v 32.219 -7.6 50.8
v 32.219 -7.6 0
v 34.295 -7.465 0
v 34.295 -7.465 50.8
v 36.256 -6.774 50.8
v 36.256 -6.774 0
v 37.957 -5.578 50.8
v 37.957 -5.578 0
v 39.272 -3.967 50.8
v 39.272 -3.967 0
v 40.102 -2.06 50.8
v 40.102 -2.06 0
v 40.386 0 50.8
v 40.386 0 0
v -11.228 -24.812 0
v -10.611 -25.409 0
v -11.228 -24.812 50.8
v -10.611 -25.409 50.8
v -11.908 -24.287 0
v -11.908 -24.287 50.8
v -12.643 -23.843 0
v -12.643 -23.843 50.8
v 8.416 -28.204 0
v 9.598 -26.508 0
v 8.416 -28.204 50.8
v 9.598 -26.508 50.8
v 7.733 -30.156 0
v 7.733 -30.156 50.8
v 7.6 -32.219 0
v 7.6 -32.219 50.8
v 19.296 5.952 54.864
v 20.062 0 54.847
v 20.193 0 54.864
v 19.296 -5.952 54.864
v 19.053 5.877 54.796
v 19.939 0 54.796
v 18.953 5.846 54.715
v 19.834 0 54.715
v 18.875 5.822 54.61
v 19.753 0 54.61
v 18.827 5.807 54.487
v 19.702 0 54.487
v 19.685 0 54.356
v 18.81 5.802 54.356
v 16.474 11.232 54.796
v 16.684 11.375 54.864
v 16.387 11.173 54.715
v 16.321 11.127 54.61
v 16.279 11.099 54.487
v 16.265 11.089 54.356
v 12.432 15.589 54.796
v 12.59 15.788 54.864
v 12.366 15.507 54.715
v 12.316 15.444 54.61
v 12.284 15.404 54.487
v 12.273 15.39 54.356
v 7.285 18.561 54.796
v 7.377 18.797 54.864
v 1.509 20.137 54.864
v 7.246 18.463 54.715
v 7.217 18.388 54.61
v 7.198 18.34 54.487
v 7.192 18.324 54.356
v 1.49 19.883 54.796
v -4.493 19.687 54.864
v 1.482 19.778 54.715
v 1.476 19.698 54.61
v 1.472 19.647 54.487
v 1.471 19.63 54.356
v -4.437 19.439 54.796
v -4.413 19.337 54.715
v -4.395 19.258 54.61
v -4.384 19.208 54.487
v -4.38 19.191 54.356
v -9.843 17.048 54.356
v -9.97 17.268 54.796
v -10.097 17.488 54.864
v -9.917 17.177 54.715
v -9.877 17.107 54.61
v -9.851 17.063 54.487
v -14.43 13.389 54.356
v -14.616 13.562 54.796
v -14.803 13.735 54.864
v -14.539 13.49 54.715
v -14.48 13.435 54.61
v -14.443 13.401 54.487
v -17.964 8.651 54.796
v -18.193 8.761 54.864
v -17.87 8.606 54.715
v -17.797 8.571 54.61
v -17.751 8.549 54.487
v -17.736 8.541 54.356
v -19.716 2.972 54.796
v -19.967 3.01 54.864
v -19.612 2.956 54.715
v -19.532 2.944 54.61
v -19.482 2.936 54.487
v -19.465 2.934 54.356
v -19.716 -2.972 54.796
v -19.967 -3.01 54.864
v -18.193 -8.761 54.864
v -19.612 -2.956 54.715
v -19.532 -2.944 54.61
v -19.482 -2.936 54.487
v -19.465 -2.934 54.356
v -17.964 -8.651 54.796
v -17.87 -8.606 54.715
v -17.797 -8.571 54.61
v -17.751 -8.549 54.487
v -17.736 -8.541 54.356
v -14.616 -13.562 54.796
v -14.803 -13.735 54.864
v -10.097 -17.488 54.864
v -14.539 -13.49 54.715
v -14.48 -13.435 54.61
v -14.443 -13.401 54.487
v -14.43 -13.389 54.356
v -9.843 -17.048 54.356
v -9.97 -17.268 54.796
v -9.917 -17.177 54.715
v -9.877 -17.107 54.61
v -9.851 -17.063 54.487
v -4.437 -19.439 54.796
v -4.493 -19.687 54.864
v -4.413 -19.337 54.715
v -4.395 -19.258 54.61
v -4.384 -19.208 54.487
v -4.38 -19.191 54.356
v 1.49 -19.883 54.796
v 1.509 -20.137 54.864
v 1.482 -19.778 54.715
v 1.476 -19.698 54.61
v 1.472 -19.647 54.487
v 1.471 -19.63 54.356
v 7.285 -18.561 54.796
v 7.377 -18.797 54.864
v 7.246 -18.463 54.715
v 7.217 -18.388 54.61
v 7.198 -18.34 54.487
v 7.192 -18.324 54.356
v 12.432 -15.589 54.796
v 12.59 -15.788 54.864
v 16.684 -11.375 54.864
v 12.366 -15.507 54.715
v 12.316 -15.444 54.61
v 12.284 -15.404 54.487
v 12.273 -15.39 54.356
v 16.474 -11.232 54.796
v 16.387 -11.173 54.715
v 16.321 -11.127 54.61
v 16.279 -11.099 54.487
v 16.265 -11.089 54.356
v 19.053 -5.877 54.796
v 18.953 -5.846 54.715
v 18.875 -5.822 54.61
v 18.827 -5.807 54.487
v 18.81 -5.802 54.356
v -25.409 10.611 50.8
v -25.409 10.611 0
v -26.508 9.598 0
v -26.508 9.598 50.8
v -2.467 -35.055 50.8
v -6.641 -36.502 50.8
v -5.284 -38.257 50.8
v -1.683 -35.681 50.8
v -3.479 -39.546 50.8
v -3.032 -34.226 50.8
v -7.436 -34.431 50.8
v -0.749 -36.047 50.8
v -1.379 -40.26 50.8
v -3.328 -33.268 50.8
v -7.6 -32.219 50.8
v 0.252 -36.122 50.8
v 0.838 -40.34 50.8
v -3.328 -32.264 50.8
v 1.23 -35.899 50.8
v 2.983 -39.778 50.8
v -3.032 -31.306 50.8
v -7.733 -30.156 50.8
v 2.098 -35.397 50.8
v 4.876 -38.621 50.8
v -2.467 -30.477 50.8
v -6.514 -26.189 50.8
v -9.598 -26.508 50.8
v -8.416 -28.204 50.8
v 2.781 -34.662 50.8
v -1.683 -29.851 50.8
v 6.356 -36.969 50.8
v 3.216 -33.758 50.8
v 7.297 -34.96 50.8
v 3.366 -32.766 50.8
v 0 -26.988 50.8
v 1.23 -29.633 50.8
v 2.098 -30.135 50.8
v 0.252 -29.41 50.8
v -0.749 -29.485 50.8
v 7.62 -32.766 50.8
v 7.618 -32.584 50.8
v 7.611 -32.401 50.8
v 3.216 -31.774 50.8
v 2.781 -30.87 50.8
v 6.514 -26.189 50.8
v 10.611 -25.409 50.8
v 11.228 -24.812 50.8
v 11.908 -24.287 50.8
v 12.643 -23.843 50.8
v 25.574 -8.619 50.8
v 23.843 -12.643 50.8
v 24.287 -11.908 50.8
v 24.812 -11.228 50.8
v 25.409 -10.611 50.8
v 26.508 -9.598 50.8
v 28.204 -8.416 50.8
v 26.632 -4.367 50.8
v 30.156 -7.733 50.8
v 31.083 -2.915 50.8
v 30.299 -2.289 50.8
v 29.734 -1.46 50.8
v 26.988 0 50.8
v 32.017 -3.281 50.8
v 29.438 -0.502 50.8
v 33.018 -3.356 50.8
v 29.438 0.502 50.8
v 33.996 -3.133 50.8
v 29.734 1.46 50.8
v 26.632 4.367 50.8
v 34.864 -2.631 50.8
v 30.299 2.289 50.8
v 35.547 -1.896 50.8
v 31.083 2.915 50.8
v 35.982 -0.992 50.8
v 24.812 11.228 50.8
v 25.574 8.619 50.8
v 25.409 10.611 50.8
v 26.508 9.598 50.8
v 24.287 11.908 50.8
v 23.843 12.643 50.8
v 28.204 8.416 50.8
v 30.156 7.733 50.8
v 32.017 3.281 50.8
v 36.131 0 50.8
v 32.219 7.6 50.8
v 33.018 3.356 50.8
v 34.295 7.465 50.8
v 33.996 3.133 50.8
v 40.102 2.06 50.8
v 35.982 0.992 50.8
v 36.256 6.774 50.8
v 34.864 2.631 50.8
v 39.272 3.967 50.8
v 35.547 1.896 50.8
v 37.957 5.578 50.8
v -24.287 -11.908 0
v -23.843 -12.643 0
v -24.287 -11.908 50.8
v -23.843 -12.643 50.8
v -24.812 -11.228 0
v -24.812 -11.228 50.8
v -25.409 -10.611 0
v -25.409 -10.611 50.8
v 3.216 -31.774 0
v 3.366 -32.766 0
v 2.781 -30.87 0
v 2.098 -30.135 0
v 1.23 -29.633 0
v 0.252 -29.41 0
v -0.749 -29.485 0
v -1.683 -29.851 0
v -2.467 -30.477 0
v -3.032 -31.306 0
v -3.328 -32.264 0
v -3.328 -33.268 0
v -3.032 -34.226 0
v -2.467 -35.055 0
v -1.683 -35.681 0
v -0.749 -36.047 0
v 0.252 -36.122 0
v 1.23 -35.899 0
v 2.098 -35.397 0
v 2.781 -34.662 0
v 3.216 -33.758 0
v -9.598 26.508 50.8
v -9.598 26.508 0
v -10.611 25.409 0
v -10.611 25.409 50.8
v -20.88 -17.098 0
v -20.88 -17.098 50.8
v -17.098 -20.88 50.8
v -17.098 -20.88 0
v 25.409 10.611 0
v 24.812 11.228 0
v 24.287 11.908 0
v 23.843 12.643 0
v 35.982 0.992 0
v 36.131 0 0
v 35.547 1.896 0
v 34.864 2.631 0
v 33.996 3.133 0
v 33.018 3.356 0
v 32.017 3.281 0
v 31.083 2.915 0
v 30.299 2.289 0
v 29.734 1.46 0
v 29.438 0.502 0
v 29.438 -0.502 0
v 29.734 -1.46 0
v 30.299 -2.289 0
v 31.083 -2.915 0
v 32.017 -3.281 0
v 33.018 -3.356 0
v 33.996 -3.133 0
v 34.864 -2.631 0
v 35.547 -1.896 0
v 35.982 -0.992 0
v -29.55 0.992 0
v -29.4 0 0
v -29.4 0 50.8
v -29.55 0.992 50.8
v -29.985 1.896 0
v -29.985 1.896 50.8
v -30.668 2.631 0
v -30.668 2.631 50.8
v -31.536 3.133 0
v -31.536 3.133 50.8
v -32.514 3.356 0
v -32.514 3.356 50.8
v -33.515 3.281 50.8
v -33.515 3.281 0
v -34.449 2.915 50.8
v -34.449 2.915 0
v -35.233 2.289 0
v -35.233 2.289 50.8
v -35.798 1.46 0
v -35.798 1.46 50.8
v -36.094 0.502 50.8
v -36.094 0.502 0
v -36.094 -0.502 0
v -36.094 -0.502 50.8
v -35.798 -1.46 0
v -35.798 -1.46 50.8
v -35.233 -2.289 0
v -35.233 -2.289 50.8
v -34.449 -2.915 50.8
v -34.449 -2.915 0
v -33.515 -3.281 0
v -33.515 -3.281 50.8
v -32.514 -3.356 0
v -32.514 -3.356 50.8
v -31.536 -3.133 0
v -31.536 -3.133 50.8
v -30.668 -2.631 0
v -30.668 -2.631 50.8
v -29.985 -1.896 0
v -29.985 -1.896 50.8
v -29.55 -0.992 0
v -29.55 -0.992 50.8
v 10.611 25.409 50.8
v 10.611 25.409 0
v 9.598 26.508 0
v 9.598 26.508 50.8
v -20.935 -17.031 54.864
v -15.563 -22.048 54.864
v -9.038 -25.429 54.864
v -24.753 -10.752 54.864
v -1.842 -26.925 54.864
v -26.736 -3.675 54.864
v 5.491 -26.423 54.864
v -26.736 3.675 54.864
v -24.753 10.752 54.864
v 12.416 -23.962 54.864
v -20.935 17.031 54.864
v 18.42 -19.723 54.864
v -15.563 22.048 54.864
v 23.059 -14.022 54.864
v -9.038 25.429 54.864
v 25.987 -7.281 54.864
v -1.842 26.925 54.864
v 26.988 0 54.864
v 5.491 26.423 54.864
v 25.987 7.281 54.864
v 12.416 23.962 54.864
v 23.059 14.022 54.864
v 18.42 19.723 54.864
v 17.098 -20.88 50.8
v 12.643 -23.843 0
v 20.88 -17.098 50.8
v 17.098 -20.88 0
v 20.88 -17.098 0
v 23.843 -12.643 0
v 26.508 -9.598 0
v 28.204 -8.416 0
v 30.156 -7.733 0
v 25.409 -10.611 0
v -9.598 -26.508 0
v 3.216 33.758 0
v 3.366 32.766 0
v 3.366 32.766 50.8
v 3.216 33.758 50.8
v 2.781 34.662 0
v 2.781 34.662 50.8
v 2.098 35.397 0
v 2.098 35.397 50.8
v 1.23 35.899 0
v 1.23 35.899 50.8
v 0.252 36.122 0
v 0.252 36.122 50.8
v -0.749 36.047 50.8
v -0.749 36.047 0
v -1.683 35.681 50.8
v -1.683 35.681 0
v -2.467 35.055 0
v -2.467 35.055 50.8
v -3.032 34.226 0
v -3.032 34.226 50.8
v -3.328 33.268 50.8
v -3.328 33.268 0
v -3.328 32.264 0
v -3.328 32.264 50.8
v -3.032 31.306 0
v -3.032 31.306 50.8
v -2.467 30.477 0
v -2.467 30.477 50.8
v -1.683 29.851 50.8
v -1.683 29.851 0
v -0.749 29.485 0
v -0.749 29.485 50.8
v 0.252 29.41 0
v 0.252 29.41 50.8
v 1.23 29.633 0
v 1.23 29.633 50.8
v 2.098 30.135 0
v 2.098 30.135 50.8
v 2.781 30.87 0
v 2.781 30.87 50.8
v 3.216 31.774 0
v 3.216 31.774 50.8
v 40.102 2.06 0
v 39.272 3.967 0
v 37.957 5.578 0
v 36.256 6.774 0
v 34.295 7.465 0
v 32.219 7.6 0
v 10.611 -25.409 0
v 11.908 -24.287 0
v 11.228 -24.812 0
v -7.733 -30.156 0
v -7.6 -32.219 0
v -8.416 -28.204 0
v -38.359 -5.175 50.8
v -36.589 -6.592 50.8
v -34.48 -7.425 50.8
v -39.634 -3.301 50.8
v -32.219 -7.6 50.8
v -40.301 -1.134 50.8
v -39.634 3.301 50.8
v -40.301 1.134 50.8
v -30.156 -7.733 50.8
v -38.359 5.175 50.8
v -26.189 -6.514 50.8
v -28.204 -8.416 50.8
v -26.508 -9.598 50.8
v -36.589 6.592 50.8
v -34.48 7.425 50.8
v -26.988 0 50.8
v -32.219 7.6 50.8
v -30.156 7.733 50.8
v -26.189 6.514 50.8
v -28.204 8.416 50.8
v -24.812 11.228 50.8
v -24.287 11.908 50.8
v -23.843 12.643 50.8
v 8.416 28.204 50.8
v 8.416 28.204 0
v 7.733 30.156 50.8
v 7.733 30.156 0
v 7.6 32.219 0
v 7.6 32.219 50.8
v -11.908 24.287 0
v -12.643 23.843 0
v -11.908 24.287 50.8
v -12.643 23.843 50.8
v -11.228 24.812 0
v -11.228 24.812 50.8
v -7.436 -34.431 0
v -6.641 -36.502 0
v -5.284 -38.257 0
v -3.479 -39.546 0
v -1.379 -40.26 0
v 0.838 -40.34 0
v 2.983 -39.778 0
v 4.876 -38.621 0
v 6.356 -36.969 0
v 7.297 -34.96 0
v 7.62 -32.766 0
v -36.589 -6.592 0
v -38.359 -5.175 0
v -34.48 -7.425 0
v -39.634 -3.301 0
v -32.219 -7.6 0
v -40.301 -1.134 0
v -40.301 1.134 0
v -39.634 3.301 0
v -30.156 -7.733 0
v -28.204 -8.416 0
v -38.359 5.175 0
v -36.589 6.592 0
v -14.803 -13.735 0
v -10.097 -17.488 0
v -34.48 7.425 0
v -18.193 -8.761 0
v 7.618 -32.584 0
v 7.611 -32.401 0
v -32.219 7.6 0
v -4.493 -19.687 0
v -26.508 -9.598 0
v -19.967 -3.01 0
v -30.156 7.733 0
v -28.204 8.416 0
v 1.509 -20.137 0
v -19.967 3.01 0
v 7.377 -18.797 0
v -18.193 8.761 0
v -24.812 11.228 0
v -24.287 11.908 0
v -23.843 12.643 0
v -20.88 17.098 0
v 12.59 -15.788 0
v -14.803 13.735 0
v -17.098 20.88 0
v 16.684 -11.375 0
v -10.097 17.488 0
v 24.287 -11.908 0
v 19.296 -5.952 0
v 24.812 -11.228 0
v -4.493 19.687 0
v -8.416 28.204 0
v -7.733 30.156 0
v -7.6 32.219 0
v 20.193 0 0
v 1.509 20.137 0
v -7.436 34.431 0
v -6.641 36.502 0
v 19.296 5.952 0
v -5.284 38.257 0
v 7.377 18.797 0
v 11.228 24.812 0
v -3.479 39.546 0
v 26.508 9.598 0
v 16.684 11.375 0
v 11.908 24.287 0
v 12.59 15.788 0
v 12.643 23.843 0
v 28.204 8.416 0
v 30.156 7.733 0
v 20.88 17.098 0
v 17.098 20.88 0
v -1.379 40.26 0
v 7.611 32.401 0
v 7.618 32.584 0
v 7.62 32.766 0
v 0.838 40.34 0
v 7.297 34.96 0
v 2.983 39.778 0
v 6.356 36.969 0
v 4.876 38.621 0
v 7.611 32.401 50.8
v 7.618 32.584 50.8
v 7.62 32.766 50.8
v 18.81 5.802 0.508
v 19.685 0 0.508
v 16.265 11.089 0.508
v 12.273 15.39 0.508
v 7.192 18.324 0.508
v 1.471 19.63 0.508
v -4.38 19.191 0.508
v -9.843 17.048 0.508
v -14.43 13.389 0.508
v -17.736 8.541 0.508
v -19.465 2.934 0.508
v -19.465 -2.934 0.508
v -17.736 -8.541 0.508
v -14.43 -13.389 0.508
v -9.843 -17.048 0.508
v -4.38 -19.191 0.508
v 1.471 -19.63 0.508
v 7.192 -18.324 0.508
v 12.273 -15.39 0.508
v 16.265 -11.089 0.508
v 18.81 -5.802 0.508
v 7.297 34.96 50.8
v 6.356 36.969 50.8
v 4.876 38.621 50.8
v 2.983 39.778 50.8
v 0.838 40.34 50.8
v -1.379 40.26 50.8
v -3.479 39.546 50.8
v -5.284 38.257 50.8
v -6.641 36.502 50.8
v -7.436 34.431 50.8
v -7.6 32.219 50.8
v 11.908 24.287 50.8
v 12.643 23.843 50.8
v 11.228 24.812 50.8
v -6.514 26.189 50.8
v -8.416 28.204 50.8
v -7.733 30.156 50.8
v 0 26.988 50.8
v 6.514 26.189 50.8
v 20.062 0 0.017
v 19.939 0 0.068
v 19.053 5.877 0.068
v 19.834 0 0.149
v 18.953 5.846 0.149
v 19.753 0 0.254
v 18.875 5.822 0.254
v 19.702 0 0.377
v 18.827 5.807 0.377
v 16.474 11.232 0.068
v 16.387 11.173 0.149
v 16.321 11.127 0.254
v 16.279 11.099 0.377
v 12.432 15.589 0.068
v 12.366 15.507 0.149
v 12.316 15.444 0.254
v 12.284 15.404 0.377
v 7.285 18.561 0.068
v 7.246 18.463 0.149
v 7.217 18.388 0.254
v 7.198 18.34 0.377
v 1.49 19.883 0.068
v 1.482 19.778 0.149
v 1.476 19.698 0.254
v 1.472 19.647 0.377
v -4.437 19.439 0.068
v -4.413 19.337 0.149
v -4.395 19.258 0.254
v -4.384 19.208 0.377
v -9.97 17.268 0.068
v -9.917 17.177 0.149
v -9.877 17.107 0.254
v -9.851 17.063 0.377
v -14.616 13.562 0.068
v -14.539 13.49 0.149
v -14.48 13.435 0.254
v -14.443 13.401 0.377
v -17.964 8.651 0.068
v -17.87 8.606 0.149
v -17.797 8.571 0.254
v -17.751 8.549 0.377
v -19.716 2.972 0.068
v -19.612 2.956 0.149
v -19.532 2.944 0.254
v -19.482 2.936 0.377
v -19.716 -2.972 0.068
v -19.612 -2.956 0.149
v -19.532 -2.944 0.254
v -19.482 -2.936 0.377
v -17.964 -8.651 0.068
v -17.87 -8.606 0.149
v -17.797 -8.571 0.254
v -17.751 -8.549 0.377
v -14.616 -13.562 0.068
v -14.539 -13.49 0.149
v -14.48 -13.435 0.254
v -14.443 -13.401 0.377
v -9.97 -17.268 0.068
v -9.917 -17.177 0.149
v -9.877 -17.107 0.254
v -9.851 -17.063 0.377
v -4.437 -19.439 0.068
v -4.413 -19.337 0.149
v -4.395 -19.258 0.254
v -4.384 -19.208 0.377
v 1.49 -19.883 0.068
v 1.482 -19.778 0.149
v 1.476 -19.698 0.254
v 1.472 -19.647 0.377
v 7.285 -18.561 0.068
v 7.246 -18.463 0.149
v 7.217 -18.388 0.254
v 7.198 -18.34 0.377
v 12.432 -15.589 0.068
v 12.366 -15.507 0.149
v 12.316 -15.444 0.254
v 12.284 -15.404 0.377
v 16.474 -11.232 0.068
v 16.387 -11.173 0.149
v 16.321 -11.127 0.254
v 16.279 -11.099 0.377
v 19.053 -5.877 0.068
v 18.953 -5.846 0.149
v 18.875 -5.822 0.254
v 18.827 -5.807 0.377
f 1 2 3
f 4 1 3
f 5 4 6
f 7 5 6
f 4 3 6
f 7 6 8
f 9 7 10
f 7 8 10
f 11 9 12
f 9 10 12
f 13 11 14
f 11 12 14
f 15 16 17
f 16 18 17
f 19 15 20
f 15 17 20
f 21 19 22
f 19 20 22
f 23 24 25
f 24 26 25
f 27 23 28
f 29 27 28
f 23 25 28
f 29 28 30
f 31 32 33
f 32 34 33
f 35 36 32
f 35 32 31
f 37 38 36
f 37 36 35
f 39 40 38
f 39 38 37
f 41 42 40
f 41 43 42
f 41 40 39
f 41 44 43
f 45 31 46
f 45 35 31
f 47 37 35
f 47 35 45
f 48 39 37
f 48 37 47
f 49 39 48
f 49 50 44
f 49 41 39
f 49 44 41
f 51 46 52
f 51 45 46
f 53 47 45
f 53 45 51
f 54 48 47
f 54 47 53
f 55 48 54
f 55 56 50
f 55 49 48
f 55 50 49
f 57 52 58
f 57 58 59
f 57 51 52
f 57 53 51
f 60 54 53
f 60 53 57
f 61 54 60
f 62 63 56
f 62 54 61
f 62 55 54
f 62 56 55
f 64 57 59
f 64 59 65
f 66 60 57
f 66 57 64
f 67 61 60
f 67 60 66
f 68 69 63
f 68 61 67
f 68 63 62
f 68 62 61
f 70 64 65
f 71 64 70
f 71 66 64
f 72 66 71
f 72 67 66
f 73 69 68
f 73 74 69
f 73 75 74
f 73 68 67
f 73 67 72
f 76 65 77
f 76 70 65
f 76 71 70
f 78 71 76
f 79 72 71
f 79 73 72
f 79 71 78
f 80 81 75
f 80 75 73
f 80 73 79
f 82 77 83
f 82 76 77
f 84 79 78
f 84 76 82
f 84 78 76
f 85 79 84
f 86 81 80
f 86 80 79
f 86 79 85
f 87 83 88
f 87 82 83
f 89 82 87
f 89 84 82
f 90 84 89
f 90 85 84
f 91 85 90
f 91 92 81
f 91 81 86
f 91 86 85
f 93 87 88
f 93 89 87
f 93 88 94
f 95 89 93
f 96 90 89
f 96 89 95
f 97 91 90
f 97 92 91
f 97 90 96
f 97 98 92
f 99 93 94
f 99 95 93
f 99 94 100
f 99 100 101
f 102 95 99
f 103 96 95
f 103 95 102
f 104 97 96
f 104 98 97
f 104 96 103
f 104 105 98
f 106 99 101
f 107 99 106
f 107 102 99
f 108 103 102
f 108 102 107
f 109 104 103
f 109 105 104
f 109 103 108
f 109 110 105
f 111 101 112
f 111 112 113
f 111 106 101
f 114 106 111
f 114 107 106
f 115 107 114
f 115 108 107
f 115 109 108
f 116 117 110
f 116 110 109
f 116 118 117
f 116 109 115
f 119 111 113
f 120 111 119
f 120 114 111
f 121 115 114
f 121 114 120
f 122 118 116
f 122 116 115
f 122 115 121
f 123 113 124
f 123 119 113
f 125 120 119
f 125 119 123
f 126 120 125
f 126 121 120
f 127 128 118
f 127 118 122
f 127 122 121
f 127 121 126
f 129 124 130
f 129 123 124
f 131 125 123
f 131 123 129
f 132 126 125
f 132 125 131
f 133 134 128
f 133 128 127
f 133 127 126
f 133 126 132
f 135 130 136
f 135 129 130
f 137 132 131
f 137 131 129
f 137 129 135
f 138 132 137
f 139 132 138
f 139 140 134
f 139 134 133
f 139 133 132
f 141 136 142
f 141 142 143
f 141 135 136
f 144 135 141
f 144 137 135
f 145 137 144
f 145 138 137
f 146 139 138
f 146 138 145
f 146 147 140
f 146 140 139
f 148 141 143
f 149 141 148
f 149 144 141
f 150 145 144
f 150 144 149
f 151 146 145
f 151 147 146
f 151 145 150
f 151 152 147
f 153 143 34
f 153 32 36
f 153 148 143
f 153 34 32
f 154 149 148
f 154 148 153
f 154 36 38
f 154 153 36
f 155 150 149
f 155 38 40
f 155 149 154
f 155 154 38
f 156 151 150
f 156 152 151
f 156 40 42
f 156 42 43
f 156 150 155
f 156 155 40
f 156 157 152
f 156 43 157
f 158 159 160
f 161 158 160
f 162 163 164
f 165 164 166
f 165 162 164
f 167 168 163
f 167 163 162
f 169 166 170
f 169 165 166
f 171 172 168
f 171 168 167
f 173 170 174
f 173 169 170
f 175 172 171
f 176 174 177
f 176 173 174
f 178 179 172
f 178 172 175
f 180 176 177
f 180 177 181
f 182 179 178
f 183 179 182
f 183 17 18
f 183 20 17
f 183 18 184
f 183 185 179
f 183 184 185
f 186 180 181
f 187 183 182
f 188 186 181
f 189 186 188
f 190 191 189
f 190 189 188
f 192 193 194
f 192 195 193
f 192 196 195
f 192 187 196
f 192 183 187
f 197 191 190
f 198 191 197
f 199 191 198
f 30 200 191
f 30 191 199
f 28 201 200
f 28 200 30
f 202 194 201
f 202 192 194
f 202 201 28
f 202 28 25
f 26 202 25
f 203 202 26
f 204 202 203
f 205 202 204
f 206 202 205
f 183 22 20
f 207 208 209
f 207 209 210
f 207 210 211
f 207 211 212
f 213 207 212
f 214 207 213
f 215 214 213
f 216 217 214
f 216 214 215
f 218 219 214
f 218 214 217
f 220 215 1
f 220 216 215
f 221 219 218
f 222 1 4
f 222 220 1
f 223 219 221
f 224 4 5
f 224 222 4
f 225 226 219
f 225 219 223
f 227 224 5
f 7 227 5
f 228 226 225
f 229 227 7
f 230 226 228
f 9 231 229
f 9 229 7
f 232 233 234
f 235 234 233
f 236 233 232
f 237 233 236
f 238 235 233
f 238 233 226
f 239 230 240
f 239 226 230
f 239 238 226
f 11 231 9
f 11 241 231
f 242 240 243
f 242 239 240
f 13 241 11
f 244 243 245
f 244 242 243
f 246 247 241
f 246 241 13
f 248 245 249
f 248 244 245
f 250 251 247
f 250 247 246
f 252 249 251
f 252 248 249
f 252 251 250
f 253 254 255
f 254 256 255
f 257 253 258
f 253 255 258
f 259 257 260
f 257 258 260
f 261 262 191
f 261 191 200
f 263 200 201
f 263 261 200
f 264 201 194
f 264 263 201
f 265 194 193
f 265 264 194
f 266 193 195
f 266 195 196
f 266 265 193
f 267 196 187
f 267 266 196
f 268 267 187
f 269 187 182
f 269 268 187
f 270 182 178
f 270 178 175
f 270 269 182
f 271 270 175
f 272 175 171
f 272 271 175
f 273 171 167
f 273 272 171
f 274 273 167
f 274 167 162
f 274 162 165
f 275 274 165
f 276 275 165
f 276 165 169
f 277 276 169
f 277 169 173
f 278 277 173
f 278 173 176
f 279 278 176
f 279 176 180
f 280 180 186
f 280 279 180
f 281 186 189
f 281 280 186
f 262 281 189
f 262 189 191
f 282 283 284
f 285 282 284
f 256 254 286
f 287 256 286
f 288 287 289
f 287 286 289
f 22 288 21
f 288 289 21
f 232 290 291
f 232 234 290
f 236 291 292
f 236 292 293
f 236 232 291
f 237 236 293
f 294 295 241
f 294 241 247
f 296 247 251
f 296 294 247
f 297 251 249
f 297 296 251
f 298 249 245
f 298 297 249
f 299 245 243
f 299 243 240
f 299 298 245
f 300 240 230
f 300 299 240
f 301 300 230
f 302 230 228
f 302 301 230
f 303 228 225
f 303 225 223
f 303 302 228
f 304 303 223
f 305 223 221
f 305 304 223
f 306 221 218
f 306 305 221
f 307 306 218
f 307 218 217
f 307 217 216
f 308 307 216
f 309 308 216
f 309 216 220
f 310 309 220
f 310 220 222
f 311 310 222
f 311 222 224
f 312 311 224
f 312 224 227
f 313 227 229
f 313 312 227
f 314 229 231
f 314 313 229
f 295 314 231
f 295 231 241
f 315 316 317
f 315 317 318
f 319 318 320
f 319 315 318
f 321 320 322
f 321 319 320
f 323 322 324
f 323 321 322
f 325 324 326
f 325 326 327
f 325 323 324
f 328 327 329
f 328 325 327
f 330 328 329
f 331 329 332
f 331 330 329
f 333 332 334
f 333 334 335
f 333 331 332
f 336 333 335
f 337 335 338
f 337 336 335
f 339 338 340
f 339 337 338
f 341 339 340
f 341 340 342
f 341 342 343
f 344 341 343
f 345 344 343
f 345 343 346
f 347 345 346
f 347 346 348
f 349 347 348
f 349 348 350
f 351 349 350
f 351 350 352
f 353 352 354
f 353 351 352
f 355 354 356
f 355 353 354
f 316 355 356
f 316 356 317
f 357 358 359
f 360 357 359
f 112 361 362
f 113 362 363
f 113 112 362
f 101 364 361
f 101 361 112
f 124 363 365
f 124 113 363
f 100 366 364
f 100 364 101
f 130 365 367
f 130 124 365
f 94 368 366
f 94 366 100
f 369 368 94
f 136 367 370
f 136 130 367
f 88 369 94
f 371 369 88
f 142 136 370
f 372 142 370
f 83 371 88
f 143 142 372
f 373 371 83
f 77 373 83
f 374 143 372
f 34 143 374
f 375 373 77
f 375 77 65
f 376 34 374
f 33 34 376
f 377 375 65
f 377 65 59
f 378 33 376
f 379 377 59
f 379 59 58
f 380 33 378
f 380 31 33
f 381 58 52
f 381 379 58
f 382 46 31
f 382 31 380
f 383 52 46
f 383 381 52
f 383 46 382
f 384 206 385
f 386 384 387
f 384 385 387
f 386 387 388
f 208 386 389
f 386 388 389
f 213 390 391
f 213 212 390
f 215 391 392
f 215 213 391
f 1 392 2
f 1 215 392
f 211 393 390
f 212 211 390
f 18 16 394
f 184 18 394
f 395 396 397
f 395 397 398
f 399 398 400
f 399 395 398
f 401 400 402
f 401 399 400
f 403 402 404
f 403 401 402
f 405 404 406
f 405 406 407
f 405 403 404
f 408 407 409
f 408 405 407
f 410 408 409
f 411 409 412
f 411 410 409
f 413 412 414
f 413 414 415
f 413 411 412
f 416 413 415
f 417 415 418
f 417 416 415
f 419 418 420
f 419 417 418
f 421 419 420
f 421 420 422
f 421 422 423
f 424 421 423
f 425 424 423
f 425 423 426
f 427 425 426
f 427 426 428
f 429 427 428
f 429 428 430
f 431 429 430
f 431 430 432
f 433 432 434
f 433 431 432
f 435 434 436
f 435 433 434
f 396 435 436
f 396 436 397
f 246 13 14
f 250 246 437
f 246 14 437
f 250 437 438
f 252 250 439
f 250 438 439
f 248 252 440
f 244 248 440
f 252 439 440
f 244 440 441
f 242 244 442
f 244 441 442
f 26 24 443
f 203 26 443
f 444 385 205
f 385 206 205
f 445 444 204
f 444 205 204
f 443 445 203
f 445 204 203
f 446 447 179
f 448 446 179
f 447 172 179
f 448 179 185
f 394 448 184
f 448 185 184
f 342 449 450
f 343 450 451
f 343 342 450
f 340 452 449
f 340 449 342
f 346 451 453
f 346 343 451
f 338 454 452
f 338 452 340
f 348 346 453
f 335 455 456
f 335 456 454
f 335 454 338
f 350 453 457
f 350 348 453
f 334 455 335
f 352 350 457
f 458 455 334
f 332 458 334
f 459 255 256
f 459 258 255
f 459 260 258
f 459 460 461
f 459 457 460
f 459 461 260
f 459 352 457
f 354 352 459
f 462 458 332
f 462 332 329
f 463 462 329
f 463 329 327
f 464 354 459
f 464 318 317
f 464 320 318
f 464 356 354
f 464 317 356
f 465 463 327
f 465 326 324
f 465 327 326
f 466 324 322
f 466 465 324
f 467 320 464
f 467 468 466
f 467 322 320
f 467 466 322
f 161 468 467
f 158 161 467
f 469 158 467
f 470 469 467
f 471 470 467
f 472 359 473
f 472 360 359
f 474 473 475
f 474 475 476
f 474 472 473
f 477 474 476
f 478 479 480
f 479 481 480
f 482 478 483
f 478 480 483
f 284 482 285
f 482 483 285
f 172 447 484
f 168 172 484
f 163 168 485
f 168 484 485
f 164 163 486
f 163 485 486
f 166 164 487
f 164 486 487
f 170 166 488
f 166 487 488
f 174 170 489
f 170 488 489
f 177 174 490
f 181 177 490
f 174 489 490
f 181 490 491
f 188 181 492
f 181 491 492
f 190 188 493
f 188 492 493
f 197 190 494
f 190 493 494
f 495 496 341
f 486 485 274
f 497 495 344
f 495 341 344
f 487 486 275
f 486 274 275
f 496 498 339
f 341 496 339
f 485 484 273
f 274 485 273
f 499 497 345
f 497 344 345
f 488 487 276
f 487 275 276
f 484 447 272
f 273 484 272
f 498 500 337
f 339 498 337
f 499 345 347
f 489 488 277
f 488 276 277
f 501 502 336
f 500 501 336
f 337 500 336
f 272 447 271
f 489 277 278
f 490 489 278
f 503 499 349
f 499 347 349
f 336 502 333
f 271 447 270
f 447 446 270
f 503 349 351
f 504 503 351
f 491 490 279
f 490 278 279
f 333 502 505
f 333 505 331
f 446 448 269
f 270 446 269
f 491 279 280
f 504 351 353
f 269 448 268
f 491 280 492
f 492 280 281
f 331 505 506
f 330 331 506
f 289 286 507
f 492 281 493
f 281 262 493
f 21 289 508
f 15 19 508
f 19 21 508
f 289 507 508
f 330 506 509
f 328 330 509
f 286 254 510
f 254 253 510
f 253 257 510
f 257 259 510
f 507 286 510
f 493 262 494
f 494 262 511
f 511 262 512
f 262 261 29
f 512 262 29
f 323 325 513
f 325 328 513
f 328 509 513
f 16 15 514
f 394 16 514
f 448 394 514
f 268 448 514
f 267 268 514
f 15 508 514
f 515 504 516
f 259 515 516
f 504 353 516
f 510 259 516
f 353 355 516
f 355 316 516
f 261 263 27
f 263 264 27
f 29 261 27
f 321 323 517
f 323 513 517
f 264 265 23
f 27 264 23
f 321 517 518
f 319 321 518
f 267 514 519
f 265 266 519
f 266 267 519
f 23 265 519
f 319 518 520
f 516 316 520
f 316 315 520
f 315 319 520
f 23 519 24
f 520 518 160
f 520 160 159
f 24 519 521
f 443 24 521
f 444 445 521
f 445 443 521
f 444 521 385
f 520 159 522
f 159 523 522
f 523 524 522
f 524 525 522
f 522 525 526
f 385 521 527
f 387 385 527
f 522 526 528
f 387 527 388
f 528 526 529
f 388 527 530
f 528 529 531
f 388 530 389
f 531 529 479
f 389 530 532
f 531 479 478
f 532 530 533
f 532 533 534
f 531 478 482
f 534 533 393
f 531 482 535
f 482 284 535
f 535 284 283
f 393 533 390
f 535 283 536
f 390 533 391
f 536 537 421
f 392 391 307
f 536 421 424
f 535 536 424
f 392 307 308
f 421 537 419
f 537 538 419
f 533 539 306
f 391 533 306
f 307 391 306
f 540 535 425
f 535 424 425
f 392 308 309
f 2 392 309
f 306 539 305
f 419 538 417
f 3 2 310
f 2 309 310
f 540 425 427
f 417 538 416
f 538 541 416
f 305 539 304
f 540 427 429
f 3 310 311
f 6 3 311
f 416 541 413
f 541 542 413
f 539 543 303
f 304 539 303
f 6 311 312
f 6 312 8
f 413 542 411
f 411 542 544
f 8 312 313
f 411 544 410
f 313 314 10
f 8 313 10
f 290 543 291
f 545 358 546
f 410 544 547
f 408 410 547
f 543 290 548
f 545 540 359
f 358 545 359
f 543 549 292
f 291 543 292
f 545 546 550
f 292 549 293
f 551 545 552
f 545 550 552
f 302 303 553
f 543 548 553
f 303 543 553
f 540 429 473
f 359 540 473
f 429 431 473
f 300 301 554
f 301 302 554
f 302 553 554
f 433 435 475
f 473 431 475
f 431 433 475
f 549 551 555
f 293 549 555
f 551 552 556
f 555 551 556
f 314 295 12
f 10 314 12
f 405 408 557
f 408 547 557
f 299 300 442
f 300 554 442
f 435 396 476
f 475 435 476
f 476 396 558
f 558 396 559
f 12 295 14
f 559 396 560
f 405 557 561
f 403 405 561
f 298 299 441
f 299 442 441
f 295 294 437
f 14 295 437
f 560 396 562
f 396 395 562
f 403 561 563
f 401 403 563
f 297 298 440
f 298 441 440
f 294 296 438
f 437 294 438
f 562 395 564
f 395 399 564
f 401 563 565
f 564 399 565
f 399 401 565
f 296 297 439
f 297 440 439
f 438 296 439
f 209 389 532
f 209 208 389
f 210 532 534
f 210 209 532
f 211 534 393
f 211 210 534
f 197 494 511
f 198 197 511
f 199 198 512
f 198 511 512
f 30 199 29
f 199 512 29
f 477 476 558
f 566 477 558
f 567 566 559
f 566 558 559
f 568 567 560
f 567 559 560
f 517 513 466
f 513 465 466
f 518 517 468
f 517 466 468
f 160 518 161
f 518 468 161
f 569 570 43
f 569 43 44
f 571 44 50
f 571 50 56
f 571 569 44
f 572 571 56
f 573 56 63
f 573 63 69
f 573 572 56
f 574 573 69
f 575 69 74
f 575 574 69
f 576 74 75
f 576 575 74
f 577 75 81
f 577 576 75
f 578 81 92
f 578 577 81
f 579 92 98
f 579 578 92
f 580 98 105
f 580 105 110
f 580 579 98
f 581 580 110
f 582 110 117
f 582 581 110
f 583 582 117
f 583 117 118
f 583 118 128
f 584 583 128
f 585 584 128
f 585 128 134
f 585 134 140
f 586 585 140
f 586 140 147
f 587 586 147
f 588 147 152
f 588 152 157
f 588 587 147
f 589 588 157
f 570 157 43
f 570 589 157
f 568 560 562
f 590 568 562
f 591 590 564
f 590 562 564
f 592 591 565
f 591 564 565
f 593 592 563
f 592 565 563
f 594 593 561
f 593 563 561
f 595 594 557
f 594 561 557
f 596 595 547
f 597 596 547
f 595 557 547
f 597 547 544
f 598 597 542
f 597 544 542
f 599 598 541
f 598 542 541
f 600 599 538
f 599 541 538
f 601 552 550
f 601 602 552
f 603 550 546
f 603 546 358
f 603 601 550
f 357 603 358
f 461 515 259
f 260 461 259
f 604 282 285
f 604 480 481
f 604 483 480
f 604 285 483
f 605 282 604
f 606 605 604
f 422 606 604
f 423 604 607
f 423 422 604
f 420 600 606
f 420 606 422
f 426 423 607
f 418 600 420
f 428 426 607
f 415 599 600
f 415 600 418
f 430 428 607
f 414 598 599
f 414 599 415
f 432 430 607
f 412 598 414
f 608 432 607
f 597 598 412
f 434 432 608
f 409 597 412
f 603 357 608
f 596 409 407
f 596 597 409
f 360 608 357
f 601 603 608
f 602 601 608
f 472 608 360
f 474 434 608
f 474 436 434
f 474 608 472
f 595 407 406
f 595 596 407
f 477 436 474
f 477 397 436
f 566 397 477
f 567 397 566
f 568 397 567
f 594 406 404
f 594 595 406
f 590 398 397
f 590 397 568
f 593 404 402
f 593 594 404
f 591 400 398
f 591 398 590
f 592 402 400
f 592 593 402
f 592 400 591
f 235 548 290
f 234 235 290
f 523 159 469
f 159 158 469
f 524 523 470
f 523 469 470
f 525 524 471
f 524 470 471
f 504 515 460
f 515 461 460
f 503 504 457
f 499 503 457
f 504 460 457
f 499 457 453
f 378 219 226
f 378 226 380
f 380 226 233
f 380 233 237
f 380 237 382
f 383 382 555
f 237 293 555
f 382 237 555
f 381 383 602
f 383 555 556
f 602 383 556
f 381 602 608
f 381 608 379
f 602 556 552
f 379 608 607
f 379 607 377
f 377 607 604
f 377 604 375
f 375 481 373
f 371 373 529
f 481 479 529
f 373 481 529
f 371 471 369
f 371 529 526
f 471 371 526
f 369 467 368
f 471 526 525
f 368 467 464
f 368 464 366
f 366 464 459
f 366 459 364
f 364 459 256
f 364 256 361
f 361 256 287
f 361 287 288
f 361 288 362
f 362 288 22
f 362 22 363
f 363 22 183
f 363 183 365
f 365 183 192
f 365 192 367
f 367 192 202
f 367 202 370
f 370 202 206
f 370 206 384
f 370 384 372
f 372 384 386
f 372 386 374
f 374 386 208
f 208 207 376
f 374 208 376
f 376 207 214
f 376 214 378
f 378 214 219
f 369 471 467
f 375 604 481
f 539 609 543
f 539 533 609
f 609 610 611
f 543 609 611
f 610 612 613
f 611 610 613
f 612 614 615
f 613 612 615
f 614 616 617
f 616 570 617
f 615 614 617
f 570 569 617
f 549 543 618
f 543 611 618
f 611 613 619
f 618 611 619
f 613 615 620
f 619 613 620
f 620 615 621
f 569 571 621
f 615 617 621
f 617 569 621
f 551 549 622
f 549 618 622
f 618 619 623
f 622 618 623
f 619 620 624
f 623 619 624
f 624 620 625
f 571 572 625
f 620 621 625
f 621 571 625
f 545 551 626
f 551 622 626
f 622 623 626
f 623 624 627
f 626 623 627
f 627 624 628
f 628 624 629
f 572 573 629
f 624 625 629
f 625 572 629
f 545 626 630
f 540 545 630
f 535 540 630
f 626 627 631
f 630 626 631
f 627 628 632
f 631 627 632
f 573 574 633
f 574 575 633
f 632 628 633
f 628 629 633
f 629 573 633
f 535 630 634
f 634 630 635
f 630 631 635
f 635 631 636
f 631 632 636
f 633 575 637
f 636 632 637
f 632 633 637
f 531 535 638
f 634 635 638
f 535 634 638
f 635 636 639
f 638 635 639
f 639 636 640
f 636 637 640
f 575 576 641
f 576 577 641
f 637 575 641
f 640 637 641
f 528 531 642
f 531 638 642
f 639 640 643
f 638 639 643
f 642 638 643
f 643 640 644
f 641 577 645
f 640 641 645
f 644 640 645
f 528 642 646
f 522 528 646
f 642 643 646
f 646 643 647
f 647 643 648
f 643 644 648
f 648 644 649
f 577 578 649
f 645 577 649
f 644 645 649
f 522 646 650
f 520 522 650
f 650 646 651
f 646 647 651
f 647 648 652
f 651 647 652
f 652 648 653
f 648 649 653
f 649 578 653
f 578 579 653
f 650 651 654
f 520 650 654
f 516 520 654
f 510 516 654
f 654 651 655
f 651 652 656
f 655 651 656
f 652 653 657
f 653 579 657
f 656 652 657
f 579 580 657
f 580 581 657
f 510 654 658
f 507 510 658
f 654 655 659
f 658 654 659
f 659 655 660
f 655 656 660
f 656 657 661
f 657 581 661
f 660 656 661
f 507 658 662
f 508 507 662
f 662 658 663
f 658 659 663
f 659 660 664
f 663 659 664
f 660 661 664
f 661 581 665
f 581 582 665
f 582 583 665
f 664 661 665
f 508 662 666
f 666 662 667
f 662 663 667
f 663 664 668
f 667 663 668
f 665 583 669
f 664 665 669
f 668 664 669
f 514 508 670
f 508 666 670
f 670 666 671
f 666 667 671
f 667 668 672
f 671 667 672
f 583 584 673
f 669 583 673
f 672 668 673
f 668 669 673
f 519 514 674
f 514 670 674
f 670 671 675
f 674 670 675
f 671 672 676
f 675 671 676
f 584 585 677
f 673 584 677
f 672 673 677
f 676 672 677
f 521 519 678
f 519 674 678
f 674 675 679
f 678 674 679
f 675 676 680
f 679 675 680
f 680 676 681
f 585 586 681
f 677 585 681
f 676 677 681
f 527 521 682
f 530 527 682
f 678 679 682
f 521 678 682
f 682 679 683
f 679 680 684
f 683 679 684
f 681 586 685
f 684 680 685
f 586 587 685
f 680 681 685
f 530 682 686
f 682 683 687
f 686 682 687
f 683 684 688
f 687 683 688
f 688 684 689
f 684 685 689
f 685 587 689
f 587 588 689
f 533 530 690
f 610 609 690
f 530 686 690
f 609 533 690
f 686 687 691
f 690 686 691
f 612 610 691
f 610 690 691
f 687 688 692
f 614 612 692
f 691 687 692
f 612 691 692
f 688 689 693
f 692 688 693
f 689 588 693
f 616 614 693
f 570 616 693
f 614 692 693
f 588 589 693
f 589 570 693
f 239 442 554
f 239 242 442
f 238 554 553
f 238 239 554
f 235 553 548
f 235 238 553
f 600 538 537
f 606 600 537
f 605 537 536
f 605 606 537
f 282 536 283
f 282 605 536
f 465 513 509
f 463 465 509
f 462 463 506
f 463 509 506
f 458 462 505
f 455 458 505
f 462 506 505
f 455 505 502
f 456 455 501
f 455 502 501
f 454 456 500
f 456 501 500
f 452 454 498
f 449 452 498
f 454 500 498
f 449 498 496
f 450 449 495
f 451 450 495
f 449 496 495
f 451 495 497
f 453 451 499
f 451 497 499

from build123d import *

# Parameters (mm, degrees)
F0_R     = 3.3655
F0_R_2   = 20.32
F1_DEPTH = 50.8
F2_R     = 7.62
F3_R     = 26.9875
F3_R_2   = 19.685
F4_DEPTH = 54.864
F5_R     = 0.508


with BuildPart() as f1:
    # F0 (on Top) → F1 (new body)
    with BuildSketch(Plane.XY):
        with BuildLine():
            ThreePointArc((-11.5499308761, 24.3910691239), (-8.0975226707, 25.7440339273), (-4.4922459427, 26.6109917636))
            ThreePointArc((-4.4922459427, 26.6109917636), (-5.8575862517, 27.8922864976), (-6.8692513658, 29.4678511747))
            Line((-6.8692513658, 29.4678511747), (-11.5499308761, 24.3910691239))
        make_face()
        with BuildLine():
            ThreePointArc((4.4922459427, 26.6109917636), (8.0975226707, 25.7440339273), (11.5499308761, 24.3910691239))
            Line((11.5499308761, 24.3910691239), (6.8692513658, 29.4678511747))
            ThreePointArc((6.8692513658, 29.4678511747), (5.8575862517, 27.8922864976), (4.4922459427, 26.6109917636))
        make_face()
        with BuildLine():
            ThreePointArc((-4.4922459427, 26.6109917636), (0, 26.9875), (4.4922459427, 26.6109917636))
            ThreePointArc((4.4922459427, 26.6109917636), (5.8575862517, 27.8922864976), (6.8692513658, 29.4678511747))
            ThreePointArc((6.8692513658, 29.4678511747), (7.4299426447, 31.0747423921), (7.62, 32.766))
            ThreePointArc((7.62, 32.766), (-1.6912576079, 40.1959426447), (-6.8692513658, 29.4678511747))
            ThreePointArc((-6.8692513658, 29.4678511747), (-5.8575862517, 27.8922864976), (-4.4922459427, 26.6109917636))
        make_face()
        with Locations((0, 32.766)):
            Circle(F0_R, mode=Mode.SUBTRACT)
        with BuildLine():
            ThreePointArc((-4.4922459427, 26.6109917636), (0, 25.146), (4.4922459427, 26.6109917636))
            ThreePointArc((4.4922459427, 26.6109917636), (0, 26.9875), (-4.4922459427, 26.6109917636))
        make_face()
        with BuildLine():
            ThreePointArc((-26.6109917636, 4.4922459427), (-25.7440339273, 8.0975226707), (-24.3910691239, 11.5499308761))
            Line((-24.3910691239, 11.5499308761), (-29.4678511747, 6.8692513658))
            ThreePointArc((-29.4678511747, 6.8692513658), (-27.8922864976, 5.8575862517), (-26.6109917636, 4.4922459427))
        make_face()
        with BuildLine():
            ThreePointArc((-26.6109917636, -4.4922459427), (-26.9875, 0), (-26.6109917636, 4.4922459427))
            ThreePointArc((-26.6109917636, 4.4922459427), (-27.8922864976, 5.8575862517), (-29.4678511747, 6.8692513658))
            ThreePointArc((-29.4678511747, 6.8692513658), (-40.386, 0), (-29.4678511747, -6.8692513658))
            ThreePointArc((-29.4678511747, -6.8692513658), (-27.8922864976, -5.8575862517), (-26.6109917636, -4.4922459427))
        make_face()
        with Locations((-32.766, 0)):
            Circle(F0_R, mode=Mode.SUBTRACT)
        with BuildLine():
            ThreePointArc((-25.146, 0), (-25.521499922, 2.3625449454), (-26.6109917636, 4.4922459427))
            ThreePointArc((-26.6109917636, 4.4922459427), (-26.9875, 0), (-26.6109917636, -4.4922459427))
            ThreePointArc((-26.6109917636, -4.4922459427), (-25.521499922, -2.3625449454), (-25.146, 0))
        make_face()
        with BuildLine():
            ThreePointArc((-24.3910691239, -11.5499308761), (-25.7440339273, -8.0975226707), (-26.6109917636, -4.4922459427))
            ThreePointArc((-26.6109917636, -4.4922459427), (-27.8922864976, -5.8575862517), (-29.4678511747, -6.8692513658))
            Line((-29.4678511747, -6.8692513658), (-24.3910691239, -11.5499308761))
        make_face()
        with BuildLine():
            ThreePointArc((-6.8692513658, -29.4678511747), (-5.8575862517, -27.8922864976), (-4.4922459427, -26.6109917636))
            ThreePointArc((-4.4922459427, -26.6109917636), (-8.0975226707, -25.7440339273), (-11.5499308761, -24.3910691239))
            Line((-11.5499308761, -24.3910691239), (-6.8692513658, -29.4678511747))
        make_face()
        with BuildLine():
            ThreePointArc((-4.4922459427, -26.6109917636), (0, -26.9875), (4.4922459427, -26.6109917636))
            ThreePointArc((4.4922459427, -26.6109917636), (0, -25.146), (-4.4922459427, -26.6109917636))
        make_face()
        with BuildLine():
            ThreePointArc((6.8692513658, -29.4678511747), (5.8575862517, -27.8922864976), (4.4922459427, -26.6109917636))
            ThreePointArc((4.4922459427, -26.6109917636), (0, -26.9875), (-4.4922459427, -26.6109917636))
            ThreePointArc((-4.4922459427, -26.6109917636), (-5.8575862517, -27.8922864976), (-6.8692513658, -29.4678511747))
            ThreePointArc((-6.8692513658, -29.4678511747), (-1.6912576079, -40.1959426447), (7.62, -32.766))
            ThreePointArc((7.62, -32.766), (7.4299426447, -31.0747423921), (6.8692513658, -29.4678511747))
        make_face()
        with Locations((0, -32.766)):
            Circle(F0_R, mode=Mode.SUBTRACT)
        with BuildLine():
            Line((6.8692513658, -29.4678511747), (11.5499308761, -24.3910691239))
            ThreePointArc((11.5499308761, -24.3910691239), (8.0975226707, -25.7440339273), (4.4922459427, -26.6109917636))
            ThreePointArc((4.4922459427, -26.6109917636), (5.8575862517, -27.8922864976), (6.8692513658, -29.4678511747))
        make_face()
        with BuildLine():
            ThreePointArc((29.4678511747, -6.8692513658), (27.8922864976, -5.8575862517), (26.6109917636, -4.4922459427))
            ThreePointArc((26.6109917636, -4.4922459427), (25.7440339273, -8.0975226707), (24.3910691239, -11.5499308761))
            Line((24.3910691239, -11.5499308761), (29.4678511747, -6.8692513658))
        make_face()
        with BuildLine():
            ThreePointArc((29.4678511747, 6.8692513658), (27.8922864976, 5.8575862517), (26.6109917636, 4.4922459427))
            ThreePointArc((26.6109917636, 4.4922459427), (26.8932082176, 2.2539982288), (26.9875, 0))
            ThreePointArc((26.9875, 0), (26.8932082176, -2.2539982288), (26.6109917636, -4.4922459427))
            ThreePointArc((26.6109917636, -4.4922459427), (27.8922864976, -5.8575862517), (29.4678511747, -6.8692513658))
            ThreePointArc((29.4678511747, -6.8692513658), (36.8238631046, -6.4496625512), (40.386, 0))
            ThreePointArc((40.386, 0), (36.8238631046, 6.4496625512), (29.4678511747, 6.8692513658))
        make_face()
        with Locations((32.766, 0)):
            Circle(F0_R, mode=Mode.SUBTRACT)
        with BuildLine():
            ThreePointArc((26.9875, 0), (26.8932082176, 2.2539982288), (26.6109917636, 4.4922459427))
            ThreePointArc((26.6109917636, 4.4922459427), (25.146, 0), (26.6109917636, -4.4922459427))
            ThreePointArc((26.6109917636, -4.4922459427), (26.8932082176, -2.2539982288), (26.9875, 0))
        make_face()
        with BuildLine():
            Line((29.4678511747, 6.8692513658), (24.3910691239, 11.5499308761))
            ThreePointArc((24.3910691239, 11.5499308761), (25.7440339273, 8.0975226707), (26.6109917636, 4.4922459427))
            ThreePointArc((26.6109917636, 4.4922459427), (27.8922864976, 5.8575862517), (29.4678511747, 6.8692513658))
        make_face()
        with BuildLine():
            ThreePointArc((26.6109917636, 4.4922459427), (25.7440339273, 8.0975226707), (24.3910691239, 11.5499308761))
            ThreePointArc((24.3910691239, 11.5499308761), (19.0830442573, 19.0830442573), (11.5499308761, 24.3910691239))
            ThreePointArc((11.5499308761, 24.3910691239), (8.0975226707, 25.7440339273), (4.4922459427, 26.6109917636))
            ThreePointArc((4.4922459427, 26.6109917636), (0, 25.146), (-4.4922459427, 26.6109917636))
            ThreePointArc((-4.4922459427, 26.6109917636), (-8.0975226707, 25.7440339273), (-11.5499308761, 24.3910691239))
            ThreePointArc((-11.5499308761, 24.3910691239), (-19.0830442573, 19.0830442573), (-24.3910691239, 11.5499308761))
            ThreePointArc((-24.3910691239, 11.5499308761), (-25.7440339273, 8.0975226707), (-26.6109917636, 4.4922459427))
            ThreePointArc((-26.6109917636, 4.4922459427), (-25.521499922, 2.3625449454), (-25.146, 0))
            ThreePointArc((-25.146, 0), (-25.521499922, -2.3625449454), (-26.6109917636, -4.4922459427))
            ThreePointArc((-26.6109917636, -4.4922459427), (-25.7440339273, -8.0975226707), (-24.3910691239, -11.5499308761))
            ThreePointArc((-24.3910691239, -11.5499308761), (-19.0830442573, -19.0830442573), (-11.5499308761, -24.3910691239))
            ThreePointArc((-11.5499308761, -24.3910691239), (-8.0975226707, -25.7440339273), (-4.4922459427, -26.6109917636))
            ThreePointArc((-4.4922459427, -26.6109917636), (0, -25.146), (4.4922459427, -26.6109917636))
            ThreePointArc((4.4922459427, -26.6109917636), (8.0975226707, -25.7440339273), (11.5499308761, -24.3910691239))
            ThreePointArc((11.5499308761, -24.3910691239), (19.0830442573, -19.0830442573), (24.3910691239, -11.5499308761))
            ThreePointArc((24.3910691239, -11.5499308761), (25.7440339273, -8.0975226707), (26.6109917636, -4.4922459427))
            ThreePointArc((26.6109917636, -4.4922459427), (25.146, 0), (26.6109917636, 4.4922459427))
        make_face()
        Circle(F0_R_2, mode=Mode.SUBTRACT)
        with BuildLine():
            ThreePointArc((-4.4922459427, 26.6109917636), (0, 26.9875), (4.4922459427, 26.6109917636))
            ThreePointArc((4.4922459427, 26.6109917636), (5.8575862517, 27.8922864976), (6.8692513658, 29.4678511747))
            ThreePointArc((6.8692513658, 29.4678511747), (7.4299426447, 31.0747423921), (7.62, 32.766))
            ThreePointArc((7.62, 32.766), (-1.6912576079, 40.1959426447), (-6.8692513658, 29.4678511747))
            ThreePointArc((-6.8692513658, 29.4678511747), (-5.8575862517, 27.8922864976), (-4.4922459427, 26.6109917636))
        make_face()
        with Locations((0, 32.766)):
            Circle(F0_R, mode=Mode.SUBTRACT)
        with BuildLine():
            ThreePointArc((-26.6109917636, -4.4922459427), (-26.9875, 0), (-26.6109917636, 4.4922459427))
            ThreePointArc((-26.6109917636, 4.4922459427), (-27.8922864976, 5.8575862517), (-29.4678511747, 6.8692513658))
            ThreePointArc((-29.4678511747, 6.8692513658), (-40.386, 0), (-29.4678511747, -6.8692513658))
            ThreePointArc((-29.4678511747, -6.8692513658), (-27.8922864976, -5.8575862517), (-26.6109917636, -4.4922459427))
        make_face()
        with Locations((-32.766, 0)):
            Circle(F0_R, mode=Mode.SUBTRACT)
        with BuildLine():
            ThreePointArc((29.4678511747, 6.8692513658), (27.8922864976, 5.8575862517), (26.6109917636, 4.4922459427))
            ThreePointArc((26.6109917636, 4.4922459427), (26.8932082176, 2.2539982288), (26.9875, 0))
            ThreePointArc((26.9875, 0), (26.8932082176, -2.2539982288), (26.6109917636, -4.4922459427))
            ThreePointArc((26.6109917636, -4.4922459427), (27.8922864976, -5.8575862517), (29.4678511747, -6.8692513658))
            ThreePointArc((29.4678511747, -6.8692513658), (36.8238631046, -6.4496625512), (40.386, 0))
            ThreePointArc((40.386, 0), (36.8238631046, 6.4496625512), (29.4678511747, 6.8692513658))
        make_face()
        with Locations((32.766, 0)):
            Circle(F0_R, mode=Mode.SUBTRACT)
        with BuildLine():
            ThreePointArc((6.8692513658, -29.4678511747), (5.8575862517, -27.8922864976), (4.4922459427, -26.6109917636))
            ThreePointArc((4.4922459427, -26.6109917636), (0, -26.9875), (-4.4922459427, -26.6109917636))
            ThreePointArc((-4.4922459427, -26.6109917636), (-5.8575862517, -27.8922864976), (-6.8692513658, -29.4678511747))
            ThreePointArc((-6.8692513658, -29.4678511747), (-1.6912576079, -40.1959426447), (7.62, -32.766))
            ThreePointArc((7.62, -32.766), (7.4299426447, -31.0747423921), (6.8692513658, -29.4678511747))
        make_face()
        with Locations((0, -32.766)):
            Circle(F0_R, mode=Mode.SUBTRACT)
    extrude(amount=F1_DEPTH)

    # F2
    f2_edges = [f1.edges().sort_by_distance(p)[0] for p in [
        (-6.869251, 29.467851, 25.4),
        (-29.467851, 6.869251, 25.4),
        (-29.467851, -6.869251, 25.4),
        (-24.391069, -11.549931, 25.4),
        (-11.549931, -24.391069, 25.4),
        (-6.869251, -29.467851, 25.4),
        (6.869251, -29.467851, 25.4),
        (11.549931, -24.391069, 25.4),
        (24.391069, -11.549931, 25.4),
        (29.467851, -6.869251, 25.4),
        (29.467851, 6.869251, 25.4),
        (24.391069, 11.549931, 25.4),
        (11.549931, 24.391069, 25.4),
        (6.869251, 29.467851, 25.4),
        (-11.549931, 24.391069, 25.4),
        (-24.391069, 11.549931, 25.4),
    ]]
    fillet(f2_edges, radius=F2_R)

    # F3 (on Top) → F4 (join)
    with BuildSketch(Plane.XY):
        Circle(F3_R)
        Circle(F3_R_2, mode=Mode.SUBTRACT)
    extrude(amount=F4_DEPTH)

    # F5
    f5_edges = [f1.edges().sort_by_distance(p)[0] for p in [
        (-19.685, 0, 54.864),
        (-19.685, 0, 0),
    ]]
    fillet(f5_edges, radius=F5_R)


solid = f1.part
